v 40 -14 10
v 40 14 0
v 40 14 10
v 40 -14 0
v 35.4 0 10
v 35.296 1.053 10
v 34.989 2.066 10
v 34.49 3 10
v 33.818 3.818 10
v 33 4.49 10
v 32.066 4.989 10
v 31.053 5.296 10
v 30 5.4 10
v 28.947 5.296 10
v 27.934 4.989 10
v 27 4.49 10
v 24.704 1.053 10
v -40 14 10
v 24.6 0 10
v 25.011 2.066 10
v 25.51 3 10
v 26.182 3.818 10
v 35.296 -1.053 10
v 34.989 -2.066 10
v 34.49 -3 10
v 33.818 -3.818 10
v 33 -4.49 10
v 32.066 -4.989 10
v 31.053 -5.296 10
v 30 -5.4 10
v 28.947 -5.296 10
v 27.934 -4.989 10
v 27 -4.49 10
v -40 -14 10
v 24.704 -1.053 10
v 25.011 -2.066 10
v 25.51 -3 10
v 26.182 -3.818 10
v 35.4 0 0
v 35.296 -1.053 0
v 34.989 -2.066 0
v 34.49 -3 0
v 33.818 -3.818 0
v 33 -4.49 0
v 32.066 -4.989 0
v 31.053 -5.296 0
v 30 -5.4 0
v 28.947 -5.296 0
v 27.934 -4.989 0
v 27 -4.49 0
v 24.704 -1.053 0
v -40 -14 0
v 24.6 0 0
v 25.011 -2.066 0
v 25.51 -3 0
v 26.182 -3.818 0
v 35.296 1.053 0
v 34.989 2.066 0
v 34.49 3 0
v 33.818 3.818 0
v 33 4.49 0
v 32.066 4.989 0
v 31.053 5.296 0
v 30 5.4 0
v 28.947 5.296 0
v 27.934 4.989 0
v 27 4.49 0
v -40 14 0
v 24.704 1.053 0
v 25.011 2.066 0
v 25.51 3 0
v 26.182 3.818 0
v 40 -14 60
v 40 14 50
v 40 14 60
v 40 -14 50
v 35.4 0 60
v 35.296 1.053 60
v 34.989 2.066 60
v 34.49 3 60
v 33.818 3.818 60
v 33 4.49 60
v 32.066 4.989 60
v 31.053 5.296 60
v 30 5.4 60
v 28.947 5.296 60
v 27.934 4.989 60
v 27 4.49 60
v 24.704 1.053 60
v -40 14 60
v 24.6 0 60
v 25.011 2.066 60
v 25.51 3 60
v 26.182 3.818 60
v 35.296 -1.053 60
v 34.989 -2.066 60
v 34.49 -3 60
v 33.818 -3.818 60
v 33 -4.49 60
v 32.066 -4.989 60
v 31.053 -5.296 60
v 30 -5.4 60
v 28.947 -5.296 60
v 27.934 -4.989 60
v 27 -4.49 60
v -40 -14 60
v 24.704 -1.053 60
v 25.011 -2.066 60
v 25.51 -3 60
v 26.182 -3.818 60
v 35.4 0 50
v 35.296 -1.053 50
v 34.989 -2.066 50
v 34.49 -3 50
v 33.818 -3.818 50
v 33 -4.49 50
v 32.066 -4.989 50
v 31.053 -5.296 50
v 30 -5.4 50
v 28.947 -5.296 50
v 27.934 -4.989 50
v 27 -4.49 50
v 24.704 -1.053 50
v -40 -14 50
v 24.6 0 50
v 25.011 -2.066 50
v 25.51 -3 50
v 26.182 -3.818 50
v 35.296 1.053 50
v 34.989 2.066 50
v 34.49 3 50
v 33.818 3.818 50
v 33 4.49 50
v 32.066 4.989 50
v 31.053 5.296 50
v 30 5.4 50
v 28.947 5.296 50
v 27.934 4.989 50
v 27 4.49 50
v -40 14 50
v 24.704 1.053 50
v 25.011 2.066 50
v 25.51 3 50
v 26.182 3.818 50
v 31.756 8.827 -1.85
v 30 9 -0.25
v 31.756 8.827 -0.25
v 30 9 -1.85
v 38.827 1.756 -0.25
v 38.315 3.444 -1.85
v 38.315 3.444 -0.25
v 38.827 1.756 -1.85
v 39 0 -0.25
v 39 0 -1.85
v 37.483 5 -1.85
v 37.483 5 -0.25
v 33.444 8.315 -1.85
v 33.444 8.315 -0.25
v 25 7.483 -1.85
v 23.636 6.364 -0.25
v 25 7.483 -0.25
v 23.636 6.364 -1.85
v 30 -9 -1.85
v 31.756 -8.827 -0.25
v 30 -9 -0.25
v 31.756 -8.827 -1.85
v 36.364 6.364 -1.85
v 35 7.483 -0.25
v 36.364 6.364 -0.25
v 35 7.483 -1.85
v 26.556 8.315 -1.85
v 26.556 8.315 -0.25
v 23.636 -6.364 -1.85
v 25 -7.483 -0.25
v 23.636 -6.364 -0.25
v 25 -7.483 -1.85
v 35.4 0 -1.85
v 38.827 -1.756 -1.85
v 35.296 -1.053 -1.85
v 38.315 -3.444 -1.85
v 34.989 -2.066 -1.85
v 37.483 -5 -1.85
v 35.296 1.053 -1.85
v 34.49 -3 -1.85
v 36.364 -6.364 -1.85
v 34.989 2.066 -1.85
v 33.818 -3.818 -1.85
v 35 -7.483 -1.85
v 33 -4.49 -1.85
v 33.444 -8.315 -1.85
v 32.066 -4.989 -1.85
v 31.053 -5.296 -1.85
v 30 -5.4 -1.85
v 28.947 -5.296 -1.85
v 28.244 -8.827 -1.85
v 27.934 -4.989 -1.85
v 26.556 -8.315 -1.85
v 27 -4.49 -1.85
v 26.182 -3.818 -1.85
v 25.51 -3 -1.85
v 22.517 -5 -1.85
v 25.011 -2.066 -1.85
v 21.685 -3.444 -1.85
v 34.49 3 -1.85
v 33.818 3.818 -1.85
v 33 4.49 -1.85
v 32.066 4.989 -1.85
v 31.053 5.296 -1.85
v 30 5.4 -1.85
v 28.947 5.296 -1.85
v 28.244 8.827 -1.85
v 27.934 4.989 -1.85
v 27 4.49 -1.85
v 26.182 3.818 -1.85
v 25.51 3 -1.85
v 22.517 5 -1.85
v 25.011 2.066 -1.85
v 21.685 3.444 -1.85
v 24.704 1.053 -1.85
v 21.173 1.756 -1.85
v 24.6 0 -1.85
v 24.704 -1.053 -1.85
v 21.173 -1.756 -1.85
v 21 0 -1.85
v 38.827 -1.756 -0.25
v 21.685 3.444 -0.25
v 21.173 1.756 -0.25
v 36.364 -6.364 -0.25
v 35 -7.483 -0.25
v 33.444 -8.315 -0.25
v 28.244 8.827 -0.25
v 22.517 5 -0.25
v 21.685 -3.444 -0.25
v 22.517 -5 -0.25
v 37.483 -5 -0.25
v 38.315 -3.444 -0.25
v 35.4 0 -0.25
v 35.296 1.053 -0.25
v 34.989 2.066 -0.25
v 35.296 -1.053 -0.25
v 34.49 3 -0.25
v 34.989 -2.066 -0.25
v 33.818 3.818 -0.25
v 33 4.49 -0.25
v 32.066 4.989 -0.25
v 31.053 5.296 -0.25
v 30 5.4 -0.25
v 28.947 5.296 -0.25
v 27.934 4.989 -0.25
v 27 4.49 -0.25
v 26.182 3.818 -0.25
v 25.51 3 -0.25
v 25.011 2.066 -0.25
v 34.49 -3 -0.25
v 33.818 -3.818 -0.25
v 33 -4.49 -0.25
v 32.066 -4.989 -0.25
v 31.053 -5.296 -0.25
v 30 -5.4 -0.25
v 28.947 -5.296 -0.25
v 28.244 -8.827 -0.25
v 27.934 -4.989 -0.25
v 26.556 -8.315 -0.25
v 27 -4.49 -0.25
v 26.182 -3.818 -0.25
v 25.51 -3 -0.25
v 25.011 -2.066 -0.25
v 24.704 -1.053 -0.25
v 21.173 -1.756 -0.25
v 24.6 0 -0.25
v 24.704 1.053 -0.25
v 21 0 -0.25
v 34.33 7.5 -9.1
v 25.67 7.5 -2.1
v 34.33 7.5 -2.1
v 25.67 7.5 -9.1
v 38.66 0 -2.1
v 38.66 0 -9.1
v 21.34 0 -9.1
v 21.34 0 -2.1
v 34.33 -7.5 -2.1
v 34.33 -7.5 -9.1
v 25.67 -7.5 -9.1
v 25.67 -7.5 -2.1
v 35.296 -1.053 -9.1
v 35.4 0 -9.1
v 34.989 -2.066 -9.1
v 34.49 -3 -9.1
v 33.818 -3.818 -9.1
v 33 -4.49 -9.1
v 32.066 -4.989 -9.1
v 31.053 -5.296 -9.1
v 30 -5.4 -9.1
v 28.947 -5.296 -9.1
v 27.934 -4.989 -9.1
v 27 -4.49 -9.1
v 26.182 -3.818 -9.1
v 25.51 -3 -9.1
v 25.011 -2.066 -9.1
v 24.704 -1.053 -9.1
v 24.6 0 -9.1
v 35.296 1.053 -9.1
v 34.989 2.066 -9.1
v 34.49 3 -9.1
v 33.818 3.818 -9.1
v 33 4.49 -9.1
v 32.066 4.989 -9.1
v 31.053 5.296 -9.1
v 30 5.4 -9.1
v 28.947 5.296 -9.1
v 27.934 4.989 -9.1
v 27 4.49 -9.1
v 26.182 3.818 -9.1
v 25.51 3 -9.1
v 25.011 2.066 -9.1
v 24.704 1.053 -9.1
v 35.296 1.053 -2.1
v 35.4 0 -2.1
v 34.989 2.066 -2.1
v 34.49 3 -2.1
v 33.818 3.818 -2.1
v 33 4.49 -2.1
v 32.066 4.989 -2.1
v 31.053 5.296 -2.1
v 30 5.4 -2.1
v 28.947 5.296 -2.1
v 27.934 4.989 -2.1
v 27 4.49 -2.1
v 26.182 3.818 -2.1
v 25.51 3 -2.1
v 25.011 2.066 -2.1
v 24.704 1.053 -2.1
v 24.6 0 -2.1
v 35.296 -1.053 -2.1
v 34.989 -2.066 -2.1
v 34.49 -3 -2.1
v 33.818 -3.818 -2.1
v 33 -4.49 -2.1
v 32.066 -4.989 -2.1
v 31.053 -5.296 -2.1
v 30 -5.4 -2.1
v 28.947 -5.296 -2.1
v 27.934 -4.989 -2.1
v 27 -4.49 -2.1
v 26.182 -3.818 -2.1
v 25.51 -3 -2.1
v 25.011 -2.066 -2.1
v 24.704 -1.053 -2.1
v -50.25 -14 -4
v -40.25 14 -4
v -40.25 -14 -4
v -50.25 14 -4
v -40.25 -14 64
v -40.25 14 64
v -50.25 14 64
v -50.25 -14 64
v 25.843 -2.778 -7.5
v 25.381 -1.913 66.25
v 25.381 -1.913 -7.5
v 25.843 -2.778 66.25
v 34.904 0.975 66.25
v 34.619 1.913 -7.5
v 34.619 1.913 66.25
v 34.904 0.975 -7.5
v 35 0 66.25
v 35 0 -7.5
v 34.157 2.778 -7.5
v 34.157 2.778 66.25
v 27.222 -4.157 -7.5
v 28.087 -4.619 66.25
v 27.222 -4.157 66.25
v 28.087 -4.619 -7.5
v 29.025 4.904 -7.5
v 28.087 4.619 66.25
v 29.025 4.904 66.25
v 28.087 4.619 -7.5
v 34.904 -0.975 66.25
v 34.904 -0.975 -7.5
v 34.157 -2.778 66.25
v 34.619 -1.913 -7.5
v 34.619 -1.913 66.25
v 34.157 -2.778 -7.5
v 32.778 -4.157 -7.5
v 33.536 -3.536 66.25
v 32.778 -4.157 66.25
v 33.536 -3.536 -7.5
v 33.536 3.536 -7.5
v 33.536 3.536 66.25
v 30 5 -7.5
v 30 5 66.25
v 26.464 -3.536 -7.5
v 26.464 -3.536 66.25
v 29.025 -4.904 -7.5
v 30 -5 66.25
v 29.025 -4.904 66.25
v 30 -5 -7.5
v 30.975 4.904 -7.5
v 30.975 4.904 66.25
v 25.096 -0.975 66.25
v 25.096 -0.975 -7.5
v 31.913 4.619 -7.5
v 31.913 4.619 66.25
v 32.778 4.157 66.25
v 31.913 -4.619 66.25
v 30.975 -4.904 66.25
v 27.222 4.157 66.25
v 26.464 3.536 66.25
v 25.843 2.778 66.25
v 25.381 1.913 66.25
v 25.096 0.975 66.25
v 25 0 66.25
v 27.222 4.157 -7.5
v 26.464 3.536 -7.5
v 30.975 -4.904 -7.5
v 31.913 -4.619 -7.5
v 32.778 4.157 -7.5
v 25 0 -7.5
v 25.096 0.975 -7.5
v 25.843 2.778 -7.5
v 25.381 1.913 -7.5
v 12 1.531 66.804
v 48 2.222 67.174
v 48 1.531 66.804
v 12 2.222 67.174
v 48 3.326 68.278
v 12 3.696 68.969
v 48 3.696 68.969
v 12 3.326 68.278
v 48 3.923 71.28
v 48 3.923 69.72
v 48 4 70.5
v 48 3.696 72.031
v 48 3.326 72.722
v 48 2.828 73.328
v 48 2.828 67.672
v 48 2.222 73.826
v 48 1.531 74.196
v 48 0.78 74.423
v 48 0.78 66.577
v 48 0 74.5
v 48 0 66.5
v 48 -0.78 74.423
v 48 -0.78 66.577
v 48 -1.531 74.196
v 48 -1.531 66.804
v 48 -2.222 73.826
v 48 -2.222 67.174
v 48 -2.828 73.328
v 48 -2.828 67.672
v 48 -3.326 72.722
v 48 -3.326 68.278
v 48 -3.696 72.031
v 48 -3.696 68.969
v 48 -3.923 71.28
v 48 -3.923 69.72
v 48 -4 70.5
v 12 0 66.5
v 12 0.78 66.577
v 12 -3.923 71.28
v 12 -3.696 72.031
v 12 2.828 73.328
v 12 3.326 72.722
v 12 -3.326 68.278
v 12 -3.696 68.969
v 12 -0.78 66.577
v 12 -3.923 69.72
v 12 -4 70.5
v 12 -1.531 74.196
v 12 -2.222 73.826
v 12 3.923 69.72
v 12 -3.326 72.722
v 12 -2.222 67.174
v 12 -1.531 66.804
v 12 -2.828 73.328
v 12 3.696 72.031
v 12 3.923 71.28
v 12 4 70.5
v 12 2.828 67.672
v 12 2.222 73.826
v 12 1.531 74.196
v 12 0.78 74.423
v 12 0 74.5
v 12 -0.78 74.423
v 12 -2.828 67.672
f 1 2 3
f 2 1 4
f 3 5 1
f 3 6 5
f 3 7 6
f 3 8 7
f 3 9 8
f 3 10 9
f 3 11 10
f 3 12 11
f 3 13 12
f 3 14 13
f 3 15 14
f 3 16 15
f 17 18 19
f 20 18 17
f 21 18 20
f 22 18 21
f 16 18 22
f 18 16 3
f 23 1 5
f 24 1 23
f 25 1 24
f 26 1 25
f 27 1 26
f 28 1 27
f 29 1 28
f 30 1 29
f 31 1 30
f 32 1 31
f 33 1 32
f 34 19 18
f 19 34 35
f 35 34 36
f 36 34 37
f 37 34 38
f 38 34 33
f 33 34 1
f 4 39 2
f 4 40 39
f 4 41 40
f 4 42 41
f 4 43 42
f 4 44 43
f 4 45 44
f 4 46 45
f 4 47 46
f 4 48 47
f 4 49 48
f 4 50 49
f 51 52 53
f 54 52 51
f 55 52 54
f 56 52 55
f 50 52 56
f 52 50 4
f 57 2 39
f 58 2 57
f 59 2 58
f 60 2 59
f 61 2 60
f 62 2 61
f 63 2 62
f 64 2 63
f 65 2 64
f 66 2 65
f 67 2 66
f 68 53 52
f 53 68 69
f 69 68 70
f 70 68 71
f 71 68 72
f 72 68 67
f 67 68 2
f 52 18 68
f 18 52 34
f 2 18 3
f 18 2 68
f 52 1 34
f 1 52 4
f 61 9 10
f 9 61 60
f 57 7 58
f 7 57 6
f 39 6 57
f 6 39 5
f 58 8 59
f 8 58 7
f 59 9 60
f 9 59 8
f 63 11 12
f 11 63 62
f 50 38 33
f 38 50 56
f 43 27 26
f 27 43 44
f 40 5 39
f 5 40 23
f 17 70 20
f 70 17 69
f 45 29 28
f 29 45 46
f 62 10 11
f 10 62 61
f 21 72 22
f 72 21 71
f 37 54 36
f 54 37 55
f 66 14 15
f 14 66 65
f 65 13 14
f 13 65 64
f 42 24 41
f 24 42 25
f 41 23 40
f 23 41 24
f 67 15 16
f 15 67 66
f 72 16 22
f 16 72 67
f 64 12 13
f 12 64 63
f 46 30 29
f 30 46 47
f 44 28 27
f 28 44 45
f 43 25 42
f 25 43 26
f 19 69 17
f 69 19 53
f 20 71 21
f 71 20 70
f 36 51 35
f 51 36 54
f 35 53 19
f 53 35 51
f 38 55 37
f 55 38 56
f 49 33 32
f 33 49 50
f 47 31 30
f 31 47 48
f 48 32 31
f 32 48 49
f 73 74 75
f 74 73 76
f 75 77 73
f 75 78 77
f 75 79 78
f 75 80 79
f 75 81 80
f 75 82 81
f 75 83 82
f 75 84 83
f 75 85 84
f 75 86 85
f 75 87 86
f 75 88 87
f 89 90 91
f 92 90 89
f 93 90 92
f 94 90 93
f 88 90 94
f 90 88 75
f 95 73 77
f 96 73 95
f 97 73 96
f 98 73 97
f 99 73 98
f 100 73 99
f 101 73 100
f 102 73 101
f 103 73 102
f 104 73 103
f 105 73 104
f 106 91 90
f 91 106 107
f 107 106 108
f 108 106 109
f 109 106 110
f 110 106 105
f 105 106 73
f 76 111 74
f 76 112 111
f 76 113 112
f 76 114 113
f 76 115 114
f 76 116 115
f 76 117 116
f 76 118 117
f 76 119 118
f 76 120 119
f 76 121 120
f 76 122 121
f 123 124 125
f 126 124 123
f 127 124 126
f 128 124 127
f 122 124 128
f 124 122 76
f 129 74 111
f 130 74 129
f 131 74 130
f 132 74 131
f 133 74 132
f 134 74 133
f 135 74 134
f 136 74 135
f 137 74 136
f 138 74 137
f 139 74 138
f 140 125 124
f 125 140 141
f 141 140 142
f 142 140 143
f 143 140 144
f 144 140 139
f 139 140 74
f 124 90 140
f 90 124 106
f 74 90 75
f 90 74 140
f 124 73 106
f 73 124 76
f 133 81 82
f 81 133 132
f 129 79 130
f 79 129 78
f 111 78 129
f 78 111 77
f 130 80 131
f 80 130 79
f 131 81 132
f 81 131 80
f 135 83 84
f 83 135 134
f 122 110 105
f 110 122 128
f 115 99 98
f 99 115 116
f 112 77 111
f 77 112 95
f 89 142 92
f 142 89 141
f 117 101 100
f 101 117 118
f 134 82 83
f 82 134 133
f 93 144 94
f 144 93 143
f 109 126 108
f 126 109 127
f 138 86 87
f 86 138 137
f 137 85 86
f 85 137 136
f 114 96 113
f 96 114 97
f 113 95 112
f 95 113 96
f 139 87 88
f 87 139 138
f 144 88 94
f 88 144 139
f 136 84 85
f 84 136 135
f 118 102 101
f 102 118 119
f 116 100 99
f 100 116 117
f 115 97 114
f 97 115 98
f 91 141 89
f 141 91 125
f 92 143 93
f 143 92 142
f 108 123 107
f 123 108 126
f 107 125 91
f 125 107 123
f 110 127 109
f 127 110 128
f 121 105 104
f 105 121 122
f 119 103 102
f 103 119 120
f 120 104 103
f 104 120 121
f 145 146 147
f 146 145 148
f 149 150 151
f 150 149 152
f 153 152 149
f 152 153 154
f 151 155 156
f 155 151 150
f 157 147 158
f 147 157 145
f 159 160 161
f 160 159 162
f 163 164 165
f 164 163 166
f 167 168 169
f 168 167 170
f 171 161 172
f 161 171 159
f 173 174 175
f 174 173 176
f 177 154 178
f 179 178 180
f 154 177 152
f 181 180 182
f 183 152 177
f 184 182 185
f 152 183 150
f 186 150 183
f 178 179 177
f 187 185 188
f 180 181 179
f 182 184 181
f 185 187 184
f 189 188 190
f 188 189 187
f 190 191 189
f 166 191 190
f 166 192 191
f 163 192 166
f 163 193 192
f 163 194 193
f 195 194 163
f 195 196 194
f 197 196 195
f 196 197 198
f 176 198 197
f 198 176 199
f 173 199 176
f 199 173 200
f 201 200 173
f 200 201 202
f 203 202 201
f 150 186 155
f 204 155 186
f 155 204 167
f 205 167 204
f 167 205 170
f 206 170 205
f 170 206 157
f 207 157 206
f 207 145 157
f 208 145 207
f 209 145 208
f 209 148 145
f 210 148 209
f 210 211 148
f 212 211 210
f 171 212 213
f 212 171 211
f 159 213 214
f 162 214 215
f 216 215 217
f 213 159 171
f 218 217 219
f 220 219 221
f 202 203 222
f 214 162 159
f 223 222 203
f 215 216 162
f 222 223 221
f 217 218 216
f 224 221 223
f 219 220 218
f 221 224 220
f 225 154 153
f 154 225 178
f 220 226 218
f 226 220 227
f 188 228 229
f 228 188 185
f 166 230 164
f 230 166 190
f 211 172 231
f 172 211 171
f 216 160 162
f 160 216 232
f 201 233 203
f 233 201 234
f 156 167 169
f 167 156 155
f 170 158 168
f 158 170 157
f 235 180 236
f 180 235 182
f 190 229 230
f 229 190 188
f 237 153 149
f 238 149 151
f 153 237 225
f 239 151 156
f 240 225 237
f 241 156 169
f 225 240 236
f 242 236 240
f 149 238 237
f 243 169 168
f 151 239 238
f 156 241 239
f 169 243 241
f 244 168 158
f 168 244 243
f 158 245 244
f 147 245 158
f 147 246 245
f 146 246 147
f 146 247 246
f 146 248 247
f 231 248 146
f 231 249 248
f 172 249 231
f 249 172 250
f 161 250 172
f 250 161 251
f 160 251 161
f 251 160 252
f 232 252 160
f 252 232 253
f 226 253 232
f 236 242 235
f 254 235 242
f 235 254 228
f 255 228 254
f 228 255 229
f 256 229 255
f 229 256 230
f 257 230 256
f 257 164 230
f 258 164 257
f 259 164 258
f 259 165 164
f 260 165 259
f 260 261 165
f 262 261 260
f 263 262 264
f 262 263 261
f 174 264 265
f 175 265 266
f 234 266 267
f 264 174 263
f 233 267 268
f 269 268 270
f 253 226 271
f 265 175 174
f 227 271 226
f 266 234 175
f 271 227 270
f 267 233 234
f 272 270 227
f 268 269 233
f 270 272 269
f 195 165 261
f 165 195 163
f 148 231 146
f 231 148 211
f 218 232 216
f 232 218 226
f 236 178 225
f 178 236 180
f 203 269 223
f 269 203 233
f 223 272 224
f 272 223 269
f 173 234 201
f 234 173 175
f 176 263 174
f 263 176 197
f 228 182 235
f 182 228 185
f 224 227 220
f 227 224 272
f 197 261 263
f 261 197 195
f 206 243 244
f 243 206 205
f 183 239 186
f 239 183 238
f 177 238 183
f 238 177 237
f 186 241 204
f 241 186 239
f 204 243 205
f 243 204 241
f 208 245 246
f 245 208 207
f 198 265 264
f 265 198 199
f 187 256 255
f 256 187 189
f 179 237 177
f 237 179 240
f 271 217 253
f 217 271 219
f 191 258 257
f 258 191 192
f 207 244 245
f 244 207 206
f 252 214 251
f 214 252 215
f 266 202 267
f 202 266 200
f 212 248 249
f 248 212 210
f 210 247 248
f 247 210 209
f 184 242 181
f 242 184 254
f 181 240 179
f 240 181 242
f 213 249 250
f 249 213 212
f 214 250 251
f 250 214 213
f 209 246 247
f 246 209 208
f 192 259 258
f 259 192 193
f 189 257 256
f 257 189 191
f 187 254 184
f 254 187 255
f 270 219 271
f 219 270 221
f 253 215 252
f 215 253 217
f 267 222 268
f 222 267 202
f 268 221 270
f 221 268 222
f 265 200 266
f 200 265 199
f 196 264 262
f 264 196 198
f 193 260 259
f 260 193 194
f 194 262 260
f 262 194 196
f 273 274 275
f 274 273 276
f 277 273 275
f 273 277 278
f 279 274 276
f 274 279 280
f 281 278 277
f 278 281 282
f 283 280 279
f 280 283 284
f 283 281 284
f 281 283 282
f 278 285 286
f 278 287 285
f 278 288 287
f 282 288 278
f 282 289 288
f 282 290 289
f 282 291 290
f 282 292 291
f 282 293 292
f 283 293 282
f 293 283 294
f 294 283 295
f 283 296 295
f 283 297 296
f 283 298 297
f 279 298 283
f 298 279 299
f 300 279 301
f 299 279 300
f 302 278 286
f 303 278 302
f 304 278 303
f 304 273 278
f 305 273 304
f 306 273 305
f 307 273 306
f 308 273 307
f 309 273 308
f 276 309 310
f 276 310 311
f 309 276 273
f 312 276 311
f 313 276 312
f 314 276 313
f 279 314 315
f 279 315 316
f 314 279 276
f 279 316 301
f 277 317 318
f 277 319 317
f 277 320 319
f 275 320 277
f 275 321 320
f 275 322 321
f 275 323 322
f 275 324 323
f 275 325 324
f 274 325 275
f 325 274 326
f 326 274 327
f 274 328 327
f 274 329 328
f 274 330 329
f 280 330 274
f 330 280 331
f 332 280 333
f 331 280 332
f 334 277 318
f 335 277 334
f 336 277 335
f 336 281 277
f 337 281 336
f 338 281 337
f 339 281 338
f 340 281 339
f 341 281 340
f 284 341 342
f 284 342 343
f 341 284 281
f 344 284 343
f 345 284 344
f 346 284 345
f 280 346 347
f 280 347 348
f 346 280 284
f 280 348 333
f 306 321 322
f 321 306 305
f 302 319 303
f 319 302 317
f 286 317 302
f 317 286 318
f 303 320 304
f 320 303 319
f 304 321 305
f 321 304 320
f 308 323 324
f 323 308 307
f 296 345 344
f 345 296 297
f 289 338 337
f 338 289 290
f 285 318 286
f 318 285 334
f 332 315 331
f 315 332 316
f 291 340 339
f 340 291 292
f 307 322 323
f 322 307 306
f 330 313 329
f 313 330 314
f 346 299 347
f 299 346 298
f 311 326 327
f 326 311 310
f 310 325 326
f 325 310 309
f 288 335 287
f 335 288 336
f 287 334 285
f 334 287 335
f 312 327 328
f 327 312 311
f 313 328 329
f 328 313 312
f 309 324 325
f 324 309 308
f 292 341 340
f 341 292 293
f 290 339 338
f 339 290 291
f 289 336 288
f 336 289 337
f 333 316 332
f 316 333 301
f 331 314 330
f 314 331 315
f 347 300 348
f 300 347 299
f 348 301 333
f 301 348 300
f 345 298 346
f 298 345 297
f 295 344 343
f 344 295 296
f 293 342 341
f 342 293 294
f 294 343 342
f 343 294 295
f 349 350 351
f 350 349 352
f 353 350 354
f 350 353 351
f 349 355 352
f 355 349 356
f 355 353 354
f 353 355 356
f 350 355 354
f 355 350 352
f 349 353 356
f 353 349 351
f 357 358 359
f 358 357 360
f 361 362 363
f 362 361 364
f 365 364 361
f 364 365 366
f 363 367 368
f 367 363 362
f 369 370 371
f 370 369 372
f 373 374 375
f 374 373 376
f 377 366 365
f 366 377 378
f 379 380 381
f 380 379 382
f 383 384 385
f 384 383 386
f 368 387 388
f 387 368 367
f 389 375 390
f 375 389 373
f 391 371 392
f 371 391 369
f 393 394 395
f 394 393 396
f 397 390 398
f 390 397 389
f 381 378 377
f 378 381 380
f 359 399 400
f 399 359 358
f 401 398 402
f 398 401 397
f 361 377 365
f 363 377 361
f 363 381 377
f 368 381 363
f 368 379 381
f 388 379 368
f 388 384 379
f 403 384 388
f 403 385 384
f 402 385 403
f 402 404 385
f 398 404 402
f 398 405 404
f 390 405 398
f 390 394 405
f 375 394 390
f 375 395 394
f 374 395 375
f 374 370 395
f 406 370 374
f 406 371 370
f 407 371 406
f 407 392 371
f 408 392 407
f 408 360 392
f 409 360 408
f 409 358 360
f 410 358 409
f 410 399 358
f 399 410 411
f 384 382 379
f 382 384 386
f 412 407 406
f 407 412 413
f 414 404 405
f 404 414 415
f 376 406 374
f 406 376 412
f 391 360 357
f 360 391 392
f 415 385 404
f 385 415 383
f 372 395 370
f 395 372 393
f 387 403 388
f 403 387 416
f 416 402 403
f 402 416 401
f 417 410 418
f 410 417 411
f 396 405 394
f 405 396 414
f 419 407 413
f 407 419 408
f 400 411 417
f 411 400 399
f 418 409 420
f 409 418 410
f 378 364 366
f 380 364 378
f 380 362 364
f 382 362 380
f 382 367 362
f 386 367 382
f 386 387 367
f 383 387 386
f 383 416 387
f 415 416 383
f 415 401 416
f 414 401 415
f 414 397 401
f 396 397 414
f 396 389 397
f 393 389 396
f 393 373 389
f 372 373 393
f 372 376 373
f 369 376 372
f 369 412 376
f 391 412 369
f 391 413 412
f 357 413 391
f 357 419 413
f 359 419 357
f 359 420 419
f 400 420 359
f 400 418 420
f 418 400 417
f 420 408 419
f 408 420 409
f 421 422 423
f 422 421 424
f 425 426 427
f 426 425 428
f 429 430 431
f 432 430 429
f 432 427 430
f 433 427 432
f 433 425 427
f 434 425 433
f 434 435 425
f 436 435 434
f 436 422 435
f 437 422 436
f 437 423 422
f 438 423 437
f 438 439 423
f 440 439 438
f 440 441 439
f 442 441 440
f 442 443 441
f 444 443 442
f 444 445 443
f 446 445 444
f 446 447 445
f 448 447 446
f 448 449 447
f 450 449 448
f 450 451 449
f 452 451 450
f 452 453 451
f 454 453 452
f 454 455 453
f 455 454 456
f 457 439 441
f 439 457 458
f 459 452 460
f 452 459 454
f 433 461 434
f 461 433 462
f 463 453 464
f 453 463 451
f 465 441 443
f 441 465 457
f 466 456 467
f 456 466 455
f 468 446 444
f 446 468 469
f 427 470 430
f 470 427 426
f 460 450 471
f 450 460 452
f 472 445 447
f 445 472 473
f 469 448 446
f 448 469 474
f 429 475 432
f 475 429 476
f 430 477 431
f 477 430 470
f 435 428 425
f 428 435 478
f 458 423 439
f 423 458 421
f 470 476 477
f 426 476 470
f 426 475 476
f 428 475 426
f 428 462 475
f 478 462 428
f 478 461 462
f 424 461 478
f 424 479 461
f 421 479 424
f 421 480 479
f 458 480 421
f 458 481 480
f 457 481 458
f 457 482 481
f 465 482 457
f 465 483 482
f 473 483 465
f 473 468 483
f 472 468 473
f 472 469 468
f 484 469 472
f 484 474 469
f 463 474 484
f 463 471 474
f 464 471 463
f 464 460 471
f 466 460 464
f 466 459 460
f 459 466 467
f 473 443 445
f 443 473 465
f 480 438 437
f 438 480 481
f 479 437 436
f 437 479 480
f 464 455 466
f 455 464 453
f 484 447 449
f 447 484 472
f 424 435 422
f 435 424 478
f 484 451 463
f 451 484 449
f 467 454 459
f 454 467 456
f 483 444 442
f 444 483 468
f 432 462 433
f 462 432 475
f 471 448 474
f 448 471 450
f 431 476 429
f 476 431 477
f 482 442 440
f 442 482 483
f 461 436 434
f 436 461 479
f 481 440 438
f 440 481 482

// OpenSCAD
$fn = 32;

// ------------------------------------------------------------------------
// C clamp: throat 50 mm, screw d10
// Every part is its own module, assembly() places every instance.
// ------------------------------------------------------------------------

// --- part 1 ---
module clamp_arm() {
  difference() {
    translate([-40, -14, 0]) cube([80, 28, 10]);
    translate([30, 0, -1]) cylinder(h = 12, d = 10.8);
  }
}

// --- part 2 ---
module clamp_spine() {
  difference() {
    translate([-34, -14, 0]) cube([68, 28, 10]);
  }
}

// --- part 3 ---
module clamp_screw() {
  translate([0, 0, -36.875]) cylinder(h = 73.75, d = 10);
}

// --- part 4 ---
module clamp_washer() {
  difference() {
      translate([0, 0, 0]) cylinder(h = 1.6, d = 18);
      translate([0, 0, -1]) cylinder(h = 3.6, d = 10.8);
    }
}

// --- part 5 ---
module clamp_nut() {
  difference() {
    linear_extrude(height = 7) polygon(points = [[8.66, 0], [4.33, 7.5], [-4.33, 7.5], [-8.66, 0], [-4.33, -7.5], [4.33, -7.5]]);
    translate([0, 0, -1]) cylinder(h = 9, d = 10.8);
  }
}

// --- part 6 ---
module tommy_bar() {
  translate([0, 0, -18]) cylinder(h = 36, d = 8);
}

// --- assembly ---
module assembly() {
  color([0.80, 0.24, 0.20]) translate([0, 0, 0]) rotate([0, 0, 0]) clamp_arm();
  color([0.20, 0.45, 0.75]) translate([0, 0, 50]) rotate([0, 0, 0]) clamp_arm();
  color([0.25, 0.62, 0.32]) translate([-50.25, 0, 30]) rotate([0, 90, 0]) clamp_spine();
  color([0.92, 0.70, 0.18]) translate([30, 0, 29.375]) rotate([0, 0, 0]) clamp_screw();
  color([0.58, 0.35, 0.70]) translate([30, 0, -1.85]) rotate([0, 0, 0]) clamp_washer();
  color([0.16, 0.66, 0.66]) translate([30, 0, -9.1]) rotate([0, 0, 0]) clamp_nut();
  color([0.85, 0.48, 0.18]) translate([30, 0, 70.5]) rotate([0, 90, 0]) tommy_bar();
}

assembly();
